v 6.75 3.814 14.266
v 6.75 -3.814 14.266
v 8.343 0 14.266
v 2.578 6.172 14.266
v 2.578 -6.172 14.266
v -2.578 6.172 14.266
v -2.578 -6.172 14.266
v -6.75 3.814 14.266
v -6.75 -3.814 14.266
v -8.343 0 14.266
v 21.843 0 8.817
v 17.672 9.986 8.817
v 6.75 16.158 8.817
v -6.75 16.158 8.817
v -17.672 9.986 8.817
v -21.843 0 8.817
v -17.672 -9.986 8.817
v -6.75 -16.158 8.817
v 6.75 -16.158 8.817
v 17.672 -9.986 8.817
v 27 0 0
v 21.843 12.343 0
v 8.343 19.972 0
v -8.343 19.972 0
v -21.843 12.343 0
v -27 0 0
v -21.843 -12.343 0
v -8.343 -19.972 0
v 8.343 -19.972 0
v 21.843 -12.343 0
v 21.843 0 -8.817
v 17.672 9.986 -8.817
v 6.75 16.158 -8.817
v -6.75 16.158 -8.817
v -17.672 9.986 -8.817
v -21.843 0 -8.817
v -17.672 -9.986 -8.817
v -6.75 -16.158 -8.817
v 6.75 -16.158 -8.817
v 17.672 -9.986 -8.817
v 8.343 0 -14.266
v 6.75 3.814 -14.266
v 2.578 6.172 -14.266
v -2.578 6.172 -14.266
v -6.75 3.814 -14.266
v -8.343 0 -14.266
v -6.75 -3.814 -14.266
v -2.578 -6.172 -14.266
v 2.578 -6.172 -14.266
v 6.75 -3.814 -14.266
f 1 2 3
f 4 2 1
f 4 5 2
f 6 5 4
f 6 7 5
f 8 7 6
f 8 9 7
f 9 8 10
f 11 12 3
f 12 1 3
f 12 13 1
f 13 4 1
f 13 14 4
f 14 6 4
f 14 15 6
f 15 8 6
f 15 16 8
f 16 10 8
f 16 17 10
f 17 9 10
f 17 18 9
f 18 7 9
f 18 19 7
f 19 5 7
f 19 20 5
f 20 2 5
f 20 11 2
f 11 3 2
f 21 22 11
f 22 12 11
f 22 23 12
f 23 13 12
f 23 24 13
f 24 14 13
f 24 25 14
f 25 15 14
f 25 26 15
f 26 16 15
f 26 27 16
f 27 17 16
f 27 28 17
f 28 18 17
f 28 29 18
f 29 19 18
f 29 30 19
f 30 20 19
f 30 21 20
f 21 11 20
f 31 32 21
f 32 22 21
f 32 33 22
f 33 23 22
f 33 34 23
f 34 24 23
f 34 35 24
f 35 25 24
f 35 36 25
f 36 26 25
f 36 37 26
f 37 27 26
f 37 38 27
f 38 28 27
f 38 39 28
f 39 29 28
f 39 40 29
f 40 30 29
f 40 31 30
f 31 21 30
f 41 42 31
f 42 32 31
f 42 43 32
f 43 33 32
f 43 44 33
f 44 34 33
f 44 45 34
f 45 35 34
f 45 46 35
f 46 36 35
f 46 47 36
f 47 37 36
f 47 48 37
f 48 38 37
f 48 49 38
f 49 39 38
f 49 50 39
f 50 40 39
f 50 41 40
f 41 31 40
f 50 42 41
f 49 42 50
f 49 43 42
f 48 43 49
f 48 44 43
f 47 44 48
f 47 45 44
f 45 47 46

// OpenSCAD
// Generated by SolidPython 1.0.1 on 2020-07-29 00:46:48


scale(v = [9, 7, 5]) {
	sphere(r = 3);
}
/***********************************************
*********      SolidPython code:      **********
************************************************
 
# import packages: SolidPython
from solid import *
from solid.utils import *
from itertools import chain, combinations, permutations


class Resize:

    def __init__(self, scad_file):
        self.scad_file = scad_file
        #self.scad_file = import_scad(scad_file)
        # cone/cylinder param:
        self.r1 = 0
        self.r2 = 0
        self.h = 0
        # rectangular prism param:
        self.w = 0
        self.l = 0
        # ellipse param:
        self.r = 0

    # import OpenScad code (file name corresponds to shape)


    # classify shape + parameters
    def assign(self, param1, param2, param3):
        if self.scad_file == 'cone.scad':
            self.r1 = param1
            self.r2 = param2
            self.h = param3
        elif self.scad_file == 'cylinder.scad':
            self.r1 = param1
            self.r2 = param2
            self.h = param3
        elif self.scad_file == 'rectangularPrism.scad':
            self.h = param1
            self.l = param2
            self.w = param3
        else:
            self.r = param1
            self.h = param2

    # resize parameters
    def iterate(self):
        x = range(3, 20, 2)
        i = 1
        if self.scad_file == 'cone.scad':
            tempList = list(permutations(x, 2))
            for temp in tempList:
                param1 = temp[0]
                param2 = temp[1]
                filepath = 'produced_scad_files/' + 'cone' + str(param1) + '_' + str(param2) + '_' + '.scad'
                scad_render_to_file(cylinder(h=param1, r1=param2, r2=0), filepath)

        elif self.scad_file == 'cylinder.scad':
            tempList = list(permutations(x, 3))
            for temp in tempList:
                param1 = temp[0]
                param2 = temp[1]
                filepath = 'produced_scad_files/' + 'cylinder' + str(param1) + '_' + str(param2) + '_' + '.scad'
                scad_render_to_file(cylinder(h=param1, r1=param2, r2=param2), filepath)

        elif self.scad_file == 'rectangularPrism.scad':
            tempList = list(permutations(x, 3))
            for temp in tempList:
                param1 = temp[0]
                param2 = temp[1]
                param3 = temp[2]
                filepath = 'produced_scad_files/' + 'rectangularPrism' + str(param1) + '_' + str(param2) + '_' + str(
                    param3) + '.scad'
                scad_render_to_file(cube(size=(param1, param2, param3)), filepath)

        elif self.scad_file == 'ellipse.scad':
            tempList = list(permutations(x, 4))
            for temp in tempList:
                param1 = temp[0]
                param2 = temp[1]
                param3 = temp[2]
                param4 = temp[3]
                filepath = 'produced_scad_files/' + 'ellipse' + str(param1) + '_' + str(param2) + '_' + str(param3) + '_' + str(param4) + '.scad'
                scad_render_to_file(scale([param1, param2, param3])(sphere(r=param4)), filepath)

    def render_to_scadfile(self):
        scad_render_to_file(scad, 'example.scad') 
 
************************************************/
